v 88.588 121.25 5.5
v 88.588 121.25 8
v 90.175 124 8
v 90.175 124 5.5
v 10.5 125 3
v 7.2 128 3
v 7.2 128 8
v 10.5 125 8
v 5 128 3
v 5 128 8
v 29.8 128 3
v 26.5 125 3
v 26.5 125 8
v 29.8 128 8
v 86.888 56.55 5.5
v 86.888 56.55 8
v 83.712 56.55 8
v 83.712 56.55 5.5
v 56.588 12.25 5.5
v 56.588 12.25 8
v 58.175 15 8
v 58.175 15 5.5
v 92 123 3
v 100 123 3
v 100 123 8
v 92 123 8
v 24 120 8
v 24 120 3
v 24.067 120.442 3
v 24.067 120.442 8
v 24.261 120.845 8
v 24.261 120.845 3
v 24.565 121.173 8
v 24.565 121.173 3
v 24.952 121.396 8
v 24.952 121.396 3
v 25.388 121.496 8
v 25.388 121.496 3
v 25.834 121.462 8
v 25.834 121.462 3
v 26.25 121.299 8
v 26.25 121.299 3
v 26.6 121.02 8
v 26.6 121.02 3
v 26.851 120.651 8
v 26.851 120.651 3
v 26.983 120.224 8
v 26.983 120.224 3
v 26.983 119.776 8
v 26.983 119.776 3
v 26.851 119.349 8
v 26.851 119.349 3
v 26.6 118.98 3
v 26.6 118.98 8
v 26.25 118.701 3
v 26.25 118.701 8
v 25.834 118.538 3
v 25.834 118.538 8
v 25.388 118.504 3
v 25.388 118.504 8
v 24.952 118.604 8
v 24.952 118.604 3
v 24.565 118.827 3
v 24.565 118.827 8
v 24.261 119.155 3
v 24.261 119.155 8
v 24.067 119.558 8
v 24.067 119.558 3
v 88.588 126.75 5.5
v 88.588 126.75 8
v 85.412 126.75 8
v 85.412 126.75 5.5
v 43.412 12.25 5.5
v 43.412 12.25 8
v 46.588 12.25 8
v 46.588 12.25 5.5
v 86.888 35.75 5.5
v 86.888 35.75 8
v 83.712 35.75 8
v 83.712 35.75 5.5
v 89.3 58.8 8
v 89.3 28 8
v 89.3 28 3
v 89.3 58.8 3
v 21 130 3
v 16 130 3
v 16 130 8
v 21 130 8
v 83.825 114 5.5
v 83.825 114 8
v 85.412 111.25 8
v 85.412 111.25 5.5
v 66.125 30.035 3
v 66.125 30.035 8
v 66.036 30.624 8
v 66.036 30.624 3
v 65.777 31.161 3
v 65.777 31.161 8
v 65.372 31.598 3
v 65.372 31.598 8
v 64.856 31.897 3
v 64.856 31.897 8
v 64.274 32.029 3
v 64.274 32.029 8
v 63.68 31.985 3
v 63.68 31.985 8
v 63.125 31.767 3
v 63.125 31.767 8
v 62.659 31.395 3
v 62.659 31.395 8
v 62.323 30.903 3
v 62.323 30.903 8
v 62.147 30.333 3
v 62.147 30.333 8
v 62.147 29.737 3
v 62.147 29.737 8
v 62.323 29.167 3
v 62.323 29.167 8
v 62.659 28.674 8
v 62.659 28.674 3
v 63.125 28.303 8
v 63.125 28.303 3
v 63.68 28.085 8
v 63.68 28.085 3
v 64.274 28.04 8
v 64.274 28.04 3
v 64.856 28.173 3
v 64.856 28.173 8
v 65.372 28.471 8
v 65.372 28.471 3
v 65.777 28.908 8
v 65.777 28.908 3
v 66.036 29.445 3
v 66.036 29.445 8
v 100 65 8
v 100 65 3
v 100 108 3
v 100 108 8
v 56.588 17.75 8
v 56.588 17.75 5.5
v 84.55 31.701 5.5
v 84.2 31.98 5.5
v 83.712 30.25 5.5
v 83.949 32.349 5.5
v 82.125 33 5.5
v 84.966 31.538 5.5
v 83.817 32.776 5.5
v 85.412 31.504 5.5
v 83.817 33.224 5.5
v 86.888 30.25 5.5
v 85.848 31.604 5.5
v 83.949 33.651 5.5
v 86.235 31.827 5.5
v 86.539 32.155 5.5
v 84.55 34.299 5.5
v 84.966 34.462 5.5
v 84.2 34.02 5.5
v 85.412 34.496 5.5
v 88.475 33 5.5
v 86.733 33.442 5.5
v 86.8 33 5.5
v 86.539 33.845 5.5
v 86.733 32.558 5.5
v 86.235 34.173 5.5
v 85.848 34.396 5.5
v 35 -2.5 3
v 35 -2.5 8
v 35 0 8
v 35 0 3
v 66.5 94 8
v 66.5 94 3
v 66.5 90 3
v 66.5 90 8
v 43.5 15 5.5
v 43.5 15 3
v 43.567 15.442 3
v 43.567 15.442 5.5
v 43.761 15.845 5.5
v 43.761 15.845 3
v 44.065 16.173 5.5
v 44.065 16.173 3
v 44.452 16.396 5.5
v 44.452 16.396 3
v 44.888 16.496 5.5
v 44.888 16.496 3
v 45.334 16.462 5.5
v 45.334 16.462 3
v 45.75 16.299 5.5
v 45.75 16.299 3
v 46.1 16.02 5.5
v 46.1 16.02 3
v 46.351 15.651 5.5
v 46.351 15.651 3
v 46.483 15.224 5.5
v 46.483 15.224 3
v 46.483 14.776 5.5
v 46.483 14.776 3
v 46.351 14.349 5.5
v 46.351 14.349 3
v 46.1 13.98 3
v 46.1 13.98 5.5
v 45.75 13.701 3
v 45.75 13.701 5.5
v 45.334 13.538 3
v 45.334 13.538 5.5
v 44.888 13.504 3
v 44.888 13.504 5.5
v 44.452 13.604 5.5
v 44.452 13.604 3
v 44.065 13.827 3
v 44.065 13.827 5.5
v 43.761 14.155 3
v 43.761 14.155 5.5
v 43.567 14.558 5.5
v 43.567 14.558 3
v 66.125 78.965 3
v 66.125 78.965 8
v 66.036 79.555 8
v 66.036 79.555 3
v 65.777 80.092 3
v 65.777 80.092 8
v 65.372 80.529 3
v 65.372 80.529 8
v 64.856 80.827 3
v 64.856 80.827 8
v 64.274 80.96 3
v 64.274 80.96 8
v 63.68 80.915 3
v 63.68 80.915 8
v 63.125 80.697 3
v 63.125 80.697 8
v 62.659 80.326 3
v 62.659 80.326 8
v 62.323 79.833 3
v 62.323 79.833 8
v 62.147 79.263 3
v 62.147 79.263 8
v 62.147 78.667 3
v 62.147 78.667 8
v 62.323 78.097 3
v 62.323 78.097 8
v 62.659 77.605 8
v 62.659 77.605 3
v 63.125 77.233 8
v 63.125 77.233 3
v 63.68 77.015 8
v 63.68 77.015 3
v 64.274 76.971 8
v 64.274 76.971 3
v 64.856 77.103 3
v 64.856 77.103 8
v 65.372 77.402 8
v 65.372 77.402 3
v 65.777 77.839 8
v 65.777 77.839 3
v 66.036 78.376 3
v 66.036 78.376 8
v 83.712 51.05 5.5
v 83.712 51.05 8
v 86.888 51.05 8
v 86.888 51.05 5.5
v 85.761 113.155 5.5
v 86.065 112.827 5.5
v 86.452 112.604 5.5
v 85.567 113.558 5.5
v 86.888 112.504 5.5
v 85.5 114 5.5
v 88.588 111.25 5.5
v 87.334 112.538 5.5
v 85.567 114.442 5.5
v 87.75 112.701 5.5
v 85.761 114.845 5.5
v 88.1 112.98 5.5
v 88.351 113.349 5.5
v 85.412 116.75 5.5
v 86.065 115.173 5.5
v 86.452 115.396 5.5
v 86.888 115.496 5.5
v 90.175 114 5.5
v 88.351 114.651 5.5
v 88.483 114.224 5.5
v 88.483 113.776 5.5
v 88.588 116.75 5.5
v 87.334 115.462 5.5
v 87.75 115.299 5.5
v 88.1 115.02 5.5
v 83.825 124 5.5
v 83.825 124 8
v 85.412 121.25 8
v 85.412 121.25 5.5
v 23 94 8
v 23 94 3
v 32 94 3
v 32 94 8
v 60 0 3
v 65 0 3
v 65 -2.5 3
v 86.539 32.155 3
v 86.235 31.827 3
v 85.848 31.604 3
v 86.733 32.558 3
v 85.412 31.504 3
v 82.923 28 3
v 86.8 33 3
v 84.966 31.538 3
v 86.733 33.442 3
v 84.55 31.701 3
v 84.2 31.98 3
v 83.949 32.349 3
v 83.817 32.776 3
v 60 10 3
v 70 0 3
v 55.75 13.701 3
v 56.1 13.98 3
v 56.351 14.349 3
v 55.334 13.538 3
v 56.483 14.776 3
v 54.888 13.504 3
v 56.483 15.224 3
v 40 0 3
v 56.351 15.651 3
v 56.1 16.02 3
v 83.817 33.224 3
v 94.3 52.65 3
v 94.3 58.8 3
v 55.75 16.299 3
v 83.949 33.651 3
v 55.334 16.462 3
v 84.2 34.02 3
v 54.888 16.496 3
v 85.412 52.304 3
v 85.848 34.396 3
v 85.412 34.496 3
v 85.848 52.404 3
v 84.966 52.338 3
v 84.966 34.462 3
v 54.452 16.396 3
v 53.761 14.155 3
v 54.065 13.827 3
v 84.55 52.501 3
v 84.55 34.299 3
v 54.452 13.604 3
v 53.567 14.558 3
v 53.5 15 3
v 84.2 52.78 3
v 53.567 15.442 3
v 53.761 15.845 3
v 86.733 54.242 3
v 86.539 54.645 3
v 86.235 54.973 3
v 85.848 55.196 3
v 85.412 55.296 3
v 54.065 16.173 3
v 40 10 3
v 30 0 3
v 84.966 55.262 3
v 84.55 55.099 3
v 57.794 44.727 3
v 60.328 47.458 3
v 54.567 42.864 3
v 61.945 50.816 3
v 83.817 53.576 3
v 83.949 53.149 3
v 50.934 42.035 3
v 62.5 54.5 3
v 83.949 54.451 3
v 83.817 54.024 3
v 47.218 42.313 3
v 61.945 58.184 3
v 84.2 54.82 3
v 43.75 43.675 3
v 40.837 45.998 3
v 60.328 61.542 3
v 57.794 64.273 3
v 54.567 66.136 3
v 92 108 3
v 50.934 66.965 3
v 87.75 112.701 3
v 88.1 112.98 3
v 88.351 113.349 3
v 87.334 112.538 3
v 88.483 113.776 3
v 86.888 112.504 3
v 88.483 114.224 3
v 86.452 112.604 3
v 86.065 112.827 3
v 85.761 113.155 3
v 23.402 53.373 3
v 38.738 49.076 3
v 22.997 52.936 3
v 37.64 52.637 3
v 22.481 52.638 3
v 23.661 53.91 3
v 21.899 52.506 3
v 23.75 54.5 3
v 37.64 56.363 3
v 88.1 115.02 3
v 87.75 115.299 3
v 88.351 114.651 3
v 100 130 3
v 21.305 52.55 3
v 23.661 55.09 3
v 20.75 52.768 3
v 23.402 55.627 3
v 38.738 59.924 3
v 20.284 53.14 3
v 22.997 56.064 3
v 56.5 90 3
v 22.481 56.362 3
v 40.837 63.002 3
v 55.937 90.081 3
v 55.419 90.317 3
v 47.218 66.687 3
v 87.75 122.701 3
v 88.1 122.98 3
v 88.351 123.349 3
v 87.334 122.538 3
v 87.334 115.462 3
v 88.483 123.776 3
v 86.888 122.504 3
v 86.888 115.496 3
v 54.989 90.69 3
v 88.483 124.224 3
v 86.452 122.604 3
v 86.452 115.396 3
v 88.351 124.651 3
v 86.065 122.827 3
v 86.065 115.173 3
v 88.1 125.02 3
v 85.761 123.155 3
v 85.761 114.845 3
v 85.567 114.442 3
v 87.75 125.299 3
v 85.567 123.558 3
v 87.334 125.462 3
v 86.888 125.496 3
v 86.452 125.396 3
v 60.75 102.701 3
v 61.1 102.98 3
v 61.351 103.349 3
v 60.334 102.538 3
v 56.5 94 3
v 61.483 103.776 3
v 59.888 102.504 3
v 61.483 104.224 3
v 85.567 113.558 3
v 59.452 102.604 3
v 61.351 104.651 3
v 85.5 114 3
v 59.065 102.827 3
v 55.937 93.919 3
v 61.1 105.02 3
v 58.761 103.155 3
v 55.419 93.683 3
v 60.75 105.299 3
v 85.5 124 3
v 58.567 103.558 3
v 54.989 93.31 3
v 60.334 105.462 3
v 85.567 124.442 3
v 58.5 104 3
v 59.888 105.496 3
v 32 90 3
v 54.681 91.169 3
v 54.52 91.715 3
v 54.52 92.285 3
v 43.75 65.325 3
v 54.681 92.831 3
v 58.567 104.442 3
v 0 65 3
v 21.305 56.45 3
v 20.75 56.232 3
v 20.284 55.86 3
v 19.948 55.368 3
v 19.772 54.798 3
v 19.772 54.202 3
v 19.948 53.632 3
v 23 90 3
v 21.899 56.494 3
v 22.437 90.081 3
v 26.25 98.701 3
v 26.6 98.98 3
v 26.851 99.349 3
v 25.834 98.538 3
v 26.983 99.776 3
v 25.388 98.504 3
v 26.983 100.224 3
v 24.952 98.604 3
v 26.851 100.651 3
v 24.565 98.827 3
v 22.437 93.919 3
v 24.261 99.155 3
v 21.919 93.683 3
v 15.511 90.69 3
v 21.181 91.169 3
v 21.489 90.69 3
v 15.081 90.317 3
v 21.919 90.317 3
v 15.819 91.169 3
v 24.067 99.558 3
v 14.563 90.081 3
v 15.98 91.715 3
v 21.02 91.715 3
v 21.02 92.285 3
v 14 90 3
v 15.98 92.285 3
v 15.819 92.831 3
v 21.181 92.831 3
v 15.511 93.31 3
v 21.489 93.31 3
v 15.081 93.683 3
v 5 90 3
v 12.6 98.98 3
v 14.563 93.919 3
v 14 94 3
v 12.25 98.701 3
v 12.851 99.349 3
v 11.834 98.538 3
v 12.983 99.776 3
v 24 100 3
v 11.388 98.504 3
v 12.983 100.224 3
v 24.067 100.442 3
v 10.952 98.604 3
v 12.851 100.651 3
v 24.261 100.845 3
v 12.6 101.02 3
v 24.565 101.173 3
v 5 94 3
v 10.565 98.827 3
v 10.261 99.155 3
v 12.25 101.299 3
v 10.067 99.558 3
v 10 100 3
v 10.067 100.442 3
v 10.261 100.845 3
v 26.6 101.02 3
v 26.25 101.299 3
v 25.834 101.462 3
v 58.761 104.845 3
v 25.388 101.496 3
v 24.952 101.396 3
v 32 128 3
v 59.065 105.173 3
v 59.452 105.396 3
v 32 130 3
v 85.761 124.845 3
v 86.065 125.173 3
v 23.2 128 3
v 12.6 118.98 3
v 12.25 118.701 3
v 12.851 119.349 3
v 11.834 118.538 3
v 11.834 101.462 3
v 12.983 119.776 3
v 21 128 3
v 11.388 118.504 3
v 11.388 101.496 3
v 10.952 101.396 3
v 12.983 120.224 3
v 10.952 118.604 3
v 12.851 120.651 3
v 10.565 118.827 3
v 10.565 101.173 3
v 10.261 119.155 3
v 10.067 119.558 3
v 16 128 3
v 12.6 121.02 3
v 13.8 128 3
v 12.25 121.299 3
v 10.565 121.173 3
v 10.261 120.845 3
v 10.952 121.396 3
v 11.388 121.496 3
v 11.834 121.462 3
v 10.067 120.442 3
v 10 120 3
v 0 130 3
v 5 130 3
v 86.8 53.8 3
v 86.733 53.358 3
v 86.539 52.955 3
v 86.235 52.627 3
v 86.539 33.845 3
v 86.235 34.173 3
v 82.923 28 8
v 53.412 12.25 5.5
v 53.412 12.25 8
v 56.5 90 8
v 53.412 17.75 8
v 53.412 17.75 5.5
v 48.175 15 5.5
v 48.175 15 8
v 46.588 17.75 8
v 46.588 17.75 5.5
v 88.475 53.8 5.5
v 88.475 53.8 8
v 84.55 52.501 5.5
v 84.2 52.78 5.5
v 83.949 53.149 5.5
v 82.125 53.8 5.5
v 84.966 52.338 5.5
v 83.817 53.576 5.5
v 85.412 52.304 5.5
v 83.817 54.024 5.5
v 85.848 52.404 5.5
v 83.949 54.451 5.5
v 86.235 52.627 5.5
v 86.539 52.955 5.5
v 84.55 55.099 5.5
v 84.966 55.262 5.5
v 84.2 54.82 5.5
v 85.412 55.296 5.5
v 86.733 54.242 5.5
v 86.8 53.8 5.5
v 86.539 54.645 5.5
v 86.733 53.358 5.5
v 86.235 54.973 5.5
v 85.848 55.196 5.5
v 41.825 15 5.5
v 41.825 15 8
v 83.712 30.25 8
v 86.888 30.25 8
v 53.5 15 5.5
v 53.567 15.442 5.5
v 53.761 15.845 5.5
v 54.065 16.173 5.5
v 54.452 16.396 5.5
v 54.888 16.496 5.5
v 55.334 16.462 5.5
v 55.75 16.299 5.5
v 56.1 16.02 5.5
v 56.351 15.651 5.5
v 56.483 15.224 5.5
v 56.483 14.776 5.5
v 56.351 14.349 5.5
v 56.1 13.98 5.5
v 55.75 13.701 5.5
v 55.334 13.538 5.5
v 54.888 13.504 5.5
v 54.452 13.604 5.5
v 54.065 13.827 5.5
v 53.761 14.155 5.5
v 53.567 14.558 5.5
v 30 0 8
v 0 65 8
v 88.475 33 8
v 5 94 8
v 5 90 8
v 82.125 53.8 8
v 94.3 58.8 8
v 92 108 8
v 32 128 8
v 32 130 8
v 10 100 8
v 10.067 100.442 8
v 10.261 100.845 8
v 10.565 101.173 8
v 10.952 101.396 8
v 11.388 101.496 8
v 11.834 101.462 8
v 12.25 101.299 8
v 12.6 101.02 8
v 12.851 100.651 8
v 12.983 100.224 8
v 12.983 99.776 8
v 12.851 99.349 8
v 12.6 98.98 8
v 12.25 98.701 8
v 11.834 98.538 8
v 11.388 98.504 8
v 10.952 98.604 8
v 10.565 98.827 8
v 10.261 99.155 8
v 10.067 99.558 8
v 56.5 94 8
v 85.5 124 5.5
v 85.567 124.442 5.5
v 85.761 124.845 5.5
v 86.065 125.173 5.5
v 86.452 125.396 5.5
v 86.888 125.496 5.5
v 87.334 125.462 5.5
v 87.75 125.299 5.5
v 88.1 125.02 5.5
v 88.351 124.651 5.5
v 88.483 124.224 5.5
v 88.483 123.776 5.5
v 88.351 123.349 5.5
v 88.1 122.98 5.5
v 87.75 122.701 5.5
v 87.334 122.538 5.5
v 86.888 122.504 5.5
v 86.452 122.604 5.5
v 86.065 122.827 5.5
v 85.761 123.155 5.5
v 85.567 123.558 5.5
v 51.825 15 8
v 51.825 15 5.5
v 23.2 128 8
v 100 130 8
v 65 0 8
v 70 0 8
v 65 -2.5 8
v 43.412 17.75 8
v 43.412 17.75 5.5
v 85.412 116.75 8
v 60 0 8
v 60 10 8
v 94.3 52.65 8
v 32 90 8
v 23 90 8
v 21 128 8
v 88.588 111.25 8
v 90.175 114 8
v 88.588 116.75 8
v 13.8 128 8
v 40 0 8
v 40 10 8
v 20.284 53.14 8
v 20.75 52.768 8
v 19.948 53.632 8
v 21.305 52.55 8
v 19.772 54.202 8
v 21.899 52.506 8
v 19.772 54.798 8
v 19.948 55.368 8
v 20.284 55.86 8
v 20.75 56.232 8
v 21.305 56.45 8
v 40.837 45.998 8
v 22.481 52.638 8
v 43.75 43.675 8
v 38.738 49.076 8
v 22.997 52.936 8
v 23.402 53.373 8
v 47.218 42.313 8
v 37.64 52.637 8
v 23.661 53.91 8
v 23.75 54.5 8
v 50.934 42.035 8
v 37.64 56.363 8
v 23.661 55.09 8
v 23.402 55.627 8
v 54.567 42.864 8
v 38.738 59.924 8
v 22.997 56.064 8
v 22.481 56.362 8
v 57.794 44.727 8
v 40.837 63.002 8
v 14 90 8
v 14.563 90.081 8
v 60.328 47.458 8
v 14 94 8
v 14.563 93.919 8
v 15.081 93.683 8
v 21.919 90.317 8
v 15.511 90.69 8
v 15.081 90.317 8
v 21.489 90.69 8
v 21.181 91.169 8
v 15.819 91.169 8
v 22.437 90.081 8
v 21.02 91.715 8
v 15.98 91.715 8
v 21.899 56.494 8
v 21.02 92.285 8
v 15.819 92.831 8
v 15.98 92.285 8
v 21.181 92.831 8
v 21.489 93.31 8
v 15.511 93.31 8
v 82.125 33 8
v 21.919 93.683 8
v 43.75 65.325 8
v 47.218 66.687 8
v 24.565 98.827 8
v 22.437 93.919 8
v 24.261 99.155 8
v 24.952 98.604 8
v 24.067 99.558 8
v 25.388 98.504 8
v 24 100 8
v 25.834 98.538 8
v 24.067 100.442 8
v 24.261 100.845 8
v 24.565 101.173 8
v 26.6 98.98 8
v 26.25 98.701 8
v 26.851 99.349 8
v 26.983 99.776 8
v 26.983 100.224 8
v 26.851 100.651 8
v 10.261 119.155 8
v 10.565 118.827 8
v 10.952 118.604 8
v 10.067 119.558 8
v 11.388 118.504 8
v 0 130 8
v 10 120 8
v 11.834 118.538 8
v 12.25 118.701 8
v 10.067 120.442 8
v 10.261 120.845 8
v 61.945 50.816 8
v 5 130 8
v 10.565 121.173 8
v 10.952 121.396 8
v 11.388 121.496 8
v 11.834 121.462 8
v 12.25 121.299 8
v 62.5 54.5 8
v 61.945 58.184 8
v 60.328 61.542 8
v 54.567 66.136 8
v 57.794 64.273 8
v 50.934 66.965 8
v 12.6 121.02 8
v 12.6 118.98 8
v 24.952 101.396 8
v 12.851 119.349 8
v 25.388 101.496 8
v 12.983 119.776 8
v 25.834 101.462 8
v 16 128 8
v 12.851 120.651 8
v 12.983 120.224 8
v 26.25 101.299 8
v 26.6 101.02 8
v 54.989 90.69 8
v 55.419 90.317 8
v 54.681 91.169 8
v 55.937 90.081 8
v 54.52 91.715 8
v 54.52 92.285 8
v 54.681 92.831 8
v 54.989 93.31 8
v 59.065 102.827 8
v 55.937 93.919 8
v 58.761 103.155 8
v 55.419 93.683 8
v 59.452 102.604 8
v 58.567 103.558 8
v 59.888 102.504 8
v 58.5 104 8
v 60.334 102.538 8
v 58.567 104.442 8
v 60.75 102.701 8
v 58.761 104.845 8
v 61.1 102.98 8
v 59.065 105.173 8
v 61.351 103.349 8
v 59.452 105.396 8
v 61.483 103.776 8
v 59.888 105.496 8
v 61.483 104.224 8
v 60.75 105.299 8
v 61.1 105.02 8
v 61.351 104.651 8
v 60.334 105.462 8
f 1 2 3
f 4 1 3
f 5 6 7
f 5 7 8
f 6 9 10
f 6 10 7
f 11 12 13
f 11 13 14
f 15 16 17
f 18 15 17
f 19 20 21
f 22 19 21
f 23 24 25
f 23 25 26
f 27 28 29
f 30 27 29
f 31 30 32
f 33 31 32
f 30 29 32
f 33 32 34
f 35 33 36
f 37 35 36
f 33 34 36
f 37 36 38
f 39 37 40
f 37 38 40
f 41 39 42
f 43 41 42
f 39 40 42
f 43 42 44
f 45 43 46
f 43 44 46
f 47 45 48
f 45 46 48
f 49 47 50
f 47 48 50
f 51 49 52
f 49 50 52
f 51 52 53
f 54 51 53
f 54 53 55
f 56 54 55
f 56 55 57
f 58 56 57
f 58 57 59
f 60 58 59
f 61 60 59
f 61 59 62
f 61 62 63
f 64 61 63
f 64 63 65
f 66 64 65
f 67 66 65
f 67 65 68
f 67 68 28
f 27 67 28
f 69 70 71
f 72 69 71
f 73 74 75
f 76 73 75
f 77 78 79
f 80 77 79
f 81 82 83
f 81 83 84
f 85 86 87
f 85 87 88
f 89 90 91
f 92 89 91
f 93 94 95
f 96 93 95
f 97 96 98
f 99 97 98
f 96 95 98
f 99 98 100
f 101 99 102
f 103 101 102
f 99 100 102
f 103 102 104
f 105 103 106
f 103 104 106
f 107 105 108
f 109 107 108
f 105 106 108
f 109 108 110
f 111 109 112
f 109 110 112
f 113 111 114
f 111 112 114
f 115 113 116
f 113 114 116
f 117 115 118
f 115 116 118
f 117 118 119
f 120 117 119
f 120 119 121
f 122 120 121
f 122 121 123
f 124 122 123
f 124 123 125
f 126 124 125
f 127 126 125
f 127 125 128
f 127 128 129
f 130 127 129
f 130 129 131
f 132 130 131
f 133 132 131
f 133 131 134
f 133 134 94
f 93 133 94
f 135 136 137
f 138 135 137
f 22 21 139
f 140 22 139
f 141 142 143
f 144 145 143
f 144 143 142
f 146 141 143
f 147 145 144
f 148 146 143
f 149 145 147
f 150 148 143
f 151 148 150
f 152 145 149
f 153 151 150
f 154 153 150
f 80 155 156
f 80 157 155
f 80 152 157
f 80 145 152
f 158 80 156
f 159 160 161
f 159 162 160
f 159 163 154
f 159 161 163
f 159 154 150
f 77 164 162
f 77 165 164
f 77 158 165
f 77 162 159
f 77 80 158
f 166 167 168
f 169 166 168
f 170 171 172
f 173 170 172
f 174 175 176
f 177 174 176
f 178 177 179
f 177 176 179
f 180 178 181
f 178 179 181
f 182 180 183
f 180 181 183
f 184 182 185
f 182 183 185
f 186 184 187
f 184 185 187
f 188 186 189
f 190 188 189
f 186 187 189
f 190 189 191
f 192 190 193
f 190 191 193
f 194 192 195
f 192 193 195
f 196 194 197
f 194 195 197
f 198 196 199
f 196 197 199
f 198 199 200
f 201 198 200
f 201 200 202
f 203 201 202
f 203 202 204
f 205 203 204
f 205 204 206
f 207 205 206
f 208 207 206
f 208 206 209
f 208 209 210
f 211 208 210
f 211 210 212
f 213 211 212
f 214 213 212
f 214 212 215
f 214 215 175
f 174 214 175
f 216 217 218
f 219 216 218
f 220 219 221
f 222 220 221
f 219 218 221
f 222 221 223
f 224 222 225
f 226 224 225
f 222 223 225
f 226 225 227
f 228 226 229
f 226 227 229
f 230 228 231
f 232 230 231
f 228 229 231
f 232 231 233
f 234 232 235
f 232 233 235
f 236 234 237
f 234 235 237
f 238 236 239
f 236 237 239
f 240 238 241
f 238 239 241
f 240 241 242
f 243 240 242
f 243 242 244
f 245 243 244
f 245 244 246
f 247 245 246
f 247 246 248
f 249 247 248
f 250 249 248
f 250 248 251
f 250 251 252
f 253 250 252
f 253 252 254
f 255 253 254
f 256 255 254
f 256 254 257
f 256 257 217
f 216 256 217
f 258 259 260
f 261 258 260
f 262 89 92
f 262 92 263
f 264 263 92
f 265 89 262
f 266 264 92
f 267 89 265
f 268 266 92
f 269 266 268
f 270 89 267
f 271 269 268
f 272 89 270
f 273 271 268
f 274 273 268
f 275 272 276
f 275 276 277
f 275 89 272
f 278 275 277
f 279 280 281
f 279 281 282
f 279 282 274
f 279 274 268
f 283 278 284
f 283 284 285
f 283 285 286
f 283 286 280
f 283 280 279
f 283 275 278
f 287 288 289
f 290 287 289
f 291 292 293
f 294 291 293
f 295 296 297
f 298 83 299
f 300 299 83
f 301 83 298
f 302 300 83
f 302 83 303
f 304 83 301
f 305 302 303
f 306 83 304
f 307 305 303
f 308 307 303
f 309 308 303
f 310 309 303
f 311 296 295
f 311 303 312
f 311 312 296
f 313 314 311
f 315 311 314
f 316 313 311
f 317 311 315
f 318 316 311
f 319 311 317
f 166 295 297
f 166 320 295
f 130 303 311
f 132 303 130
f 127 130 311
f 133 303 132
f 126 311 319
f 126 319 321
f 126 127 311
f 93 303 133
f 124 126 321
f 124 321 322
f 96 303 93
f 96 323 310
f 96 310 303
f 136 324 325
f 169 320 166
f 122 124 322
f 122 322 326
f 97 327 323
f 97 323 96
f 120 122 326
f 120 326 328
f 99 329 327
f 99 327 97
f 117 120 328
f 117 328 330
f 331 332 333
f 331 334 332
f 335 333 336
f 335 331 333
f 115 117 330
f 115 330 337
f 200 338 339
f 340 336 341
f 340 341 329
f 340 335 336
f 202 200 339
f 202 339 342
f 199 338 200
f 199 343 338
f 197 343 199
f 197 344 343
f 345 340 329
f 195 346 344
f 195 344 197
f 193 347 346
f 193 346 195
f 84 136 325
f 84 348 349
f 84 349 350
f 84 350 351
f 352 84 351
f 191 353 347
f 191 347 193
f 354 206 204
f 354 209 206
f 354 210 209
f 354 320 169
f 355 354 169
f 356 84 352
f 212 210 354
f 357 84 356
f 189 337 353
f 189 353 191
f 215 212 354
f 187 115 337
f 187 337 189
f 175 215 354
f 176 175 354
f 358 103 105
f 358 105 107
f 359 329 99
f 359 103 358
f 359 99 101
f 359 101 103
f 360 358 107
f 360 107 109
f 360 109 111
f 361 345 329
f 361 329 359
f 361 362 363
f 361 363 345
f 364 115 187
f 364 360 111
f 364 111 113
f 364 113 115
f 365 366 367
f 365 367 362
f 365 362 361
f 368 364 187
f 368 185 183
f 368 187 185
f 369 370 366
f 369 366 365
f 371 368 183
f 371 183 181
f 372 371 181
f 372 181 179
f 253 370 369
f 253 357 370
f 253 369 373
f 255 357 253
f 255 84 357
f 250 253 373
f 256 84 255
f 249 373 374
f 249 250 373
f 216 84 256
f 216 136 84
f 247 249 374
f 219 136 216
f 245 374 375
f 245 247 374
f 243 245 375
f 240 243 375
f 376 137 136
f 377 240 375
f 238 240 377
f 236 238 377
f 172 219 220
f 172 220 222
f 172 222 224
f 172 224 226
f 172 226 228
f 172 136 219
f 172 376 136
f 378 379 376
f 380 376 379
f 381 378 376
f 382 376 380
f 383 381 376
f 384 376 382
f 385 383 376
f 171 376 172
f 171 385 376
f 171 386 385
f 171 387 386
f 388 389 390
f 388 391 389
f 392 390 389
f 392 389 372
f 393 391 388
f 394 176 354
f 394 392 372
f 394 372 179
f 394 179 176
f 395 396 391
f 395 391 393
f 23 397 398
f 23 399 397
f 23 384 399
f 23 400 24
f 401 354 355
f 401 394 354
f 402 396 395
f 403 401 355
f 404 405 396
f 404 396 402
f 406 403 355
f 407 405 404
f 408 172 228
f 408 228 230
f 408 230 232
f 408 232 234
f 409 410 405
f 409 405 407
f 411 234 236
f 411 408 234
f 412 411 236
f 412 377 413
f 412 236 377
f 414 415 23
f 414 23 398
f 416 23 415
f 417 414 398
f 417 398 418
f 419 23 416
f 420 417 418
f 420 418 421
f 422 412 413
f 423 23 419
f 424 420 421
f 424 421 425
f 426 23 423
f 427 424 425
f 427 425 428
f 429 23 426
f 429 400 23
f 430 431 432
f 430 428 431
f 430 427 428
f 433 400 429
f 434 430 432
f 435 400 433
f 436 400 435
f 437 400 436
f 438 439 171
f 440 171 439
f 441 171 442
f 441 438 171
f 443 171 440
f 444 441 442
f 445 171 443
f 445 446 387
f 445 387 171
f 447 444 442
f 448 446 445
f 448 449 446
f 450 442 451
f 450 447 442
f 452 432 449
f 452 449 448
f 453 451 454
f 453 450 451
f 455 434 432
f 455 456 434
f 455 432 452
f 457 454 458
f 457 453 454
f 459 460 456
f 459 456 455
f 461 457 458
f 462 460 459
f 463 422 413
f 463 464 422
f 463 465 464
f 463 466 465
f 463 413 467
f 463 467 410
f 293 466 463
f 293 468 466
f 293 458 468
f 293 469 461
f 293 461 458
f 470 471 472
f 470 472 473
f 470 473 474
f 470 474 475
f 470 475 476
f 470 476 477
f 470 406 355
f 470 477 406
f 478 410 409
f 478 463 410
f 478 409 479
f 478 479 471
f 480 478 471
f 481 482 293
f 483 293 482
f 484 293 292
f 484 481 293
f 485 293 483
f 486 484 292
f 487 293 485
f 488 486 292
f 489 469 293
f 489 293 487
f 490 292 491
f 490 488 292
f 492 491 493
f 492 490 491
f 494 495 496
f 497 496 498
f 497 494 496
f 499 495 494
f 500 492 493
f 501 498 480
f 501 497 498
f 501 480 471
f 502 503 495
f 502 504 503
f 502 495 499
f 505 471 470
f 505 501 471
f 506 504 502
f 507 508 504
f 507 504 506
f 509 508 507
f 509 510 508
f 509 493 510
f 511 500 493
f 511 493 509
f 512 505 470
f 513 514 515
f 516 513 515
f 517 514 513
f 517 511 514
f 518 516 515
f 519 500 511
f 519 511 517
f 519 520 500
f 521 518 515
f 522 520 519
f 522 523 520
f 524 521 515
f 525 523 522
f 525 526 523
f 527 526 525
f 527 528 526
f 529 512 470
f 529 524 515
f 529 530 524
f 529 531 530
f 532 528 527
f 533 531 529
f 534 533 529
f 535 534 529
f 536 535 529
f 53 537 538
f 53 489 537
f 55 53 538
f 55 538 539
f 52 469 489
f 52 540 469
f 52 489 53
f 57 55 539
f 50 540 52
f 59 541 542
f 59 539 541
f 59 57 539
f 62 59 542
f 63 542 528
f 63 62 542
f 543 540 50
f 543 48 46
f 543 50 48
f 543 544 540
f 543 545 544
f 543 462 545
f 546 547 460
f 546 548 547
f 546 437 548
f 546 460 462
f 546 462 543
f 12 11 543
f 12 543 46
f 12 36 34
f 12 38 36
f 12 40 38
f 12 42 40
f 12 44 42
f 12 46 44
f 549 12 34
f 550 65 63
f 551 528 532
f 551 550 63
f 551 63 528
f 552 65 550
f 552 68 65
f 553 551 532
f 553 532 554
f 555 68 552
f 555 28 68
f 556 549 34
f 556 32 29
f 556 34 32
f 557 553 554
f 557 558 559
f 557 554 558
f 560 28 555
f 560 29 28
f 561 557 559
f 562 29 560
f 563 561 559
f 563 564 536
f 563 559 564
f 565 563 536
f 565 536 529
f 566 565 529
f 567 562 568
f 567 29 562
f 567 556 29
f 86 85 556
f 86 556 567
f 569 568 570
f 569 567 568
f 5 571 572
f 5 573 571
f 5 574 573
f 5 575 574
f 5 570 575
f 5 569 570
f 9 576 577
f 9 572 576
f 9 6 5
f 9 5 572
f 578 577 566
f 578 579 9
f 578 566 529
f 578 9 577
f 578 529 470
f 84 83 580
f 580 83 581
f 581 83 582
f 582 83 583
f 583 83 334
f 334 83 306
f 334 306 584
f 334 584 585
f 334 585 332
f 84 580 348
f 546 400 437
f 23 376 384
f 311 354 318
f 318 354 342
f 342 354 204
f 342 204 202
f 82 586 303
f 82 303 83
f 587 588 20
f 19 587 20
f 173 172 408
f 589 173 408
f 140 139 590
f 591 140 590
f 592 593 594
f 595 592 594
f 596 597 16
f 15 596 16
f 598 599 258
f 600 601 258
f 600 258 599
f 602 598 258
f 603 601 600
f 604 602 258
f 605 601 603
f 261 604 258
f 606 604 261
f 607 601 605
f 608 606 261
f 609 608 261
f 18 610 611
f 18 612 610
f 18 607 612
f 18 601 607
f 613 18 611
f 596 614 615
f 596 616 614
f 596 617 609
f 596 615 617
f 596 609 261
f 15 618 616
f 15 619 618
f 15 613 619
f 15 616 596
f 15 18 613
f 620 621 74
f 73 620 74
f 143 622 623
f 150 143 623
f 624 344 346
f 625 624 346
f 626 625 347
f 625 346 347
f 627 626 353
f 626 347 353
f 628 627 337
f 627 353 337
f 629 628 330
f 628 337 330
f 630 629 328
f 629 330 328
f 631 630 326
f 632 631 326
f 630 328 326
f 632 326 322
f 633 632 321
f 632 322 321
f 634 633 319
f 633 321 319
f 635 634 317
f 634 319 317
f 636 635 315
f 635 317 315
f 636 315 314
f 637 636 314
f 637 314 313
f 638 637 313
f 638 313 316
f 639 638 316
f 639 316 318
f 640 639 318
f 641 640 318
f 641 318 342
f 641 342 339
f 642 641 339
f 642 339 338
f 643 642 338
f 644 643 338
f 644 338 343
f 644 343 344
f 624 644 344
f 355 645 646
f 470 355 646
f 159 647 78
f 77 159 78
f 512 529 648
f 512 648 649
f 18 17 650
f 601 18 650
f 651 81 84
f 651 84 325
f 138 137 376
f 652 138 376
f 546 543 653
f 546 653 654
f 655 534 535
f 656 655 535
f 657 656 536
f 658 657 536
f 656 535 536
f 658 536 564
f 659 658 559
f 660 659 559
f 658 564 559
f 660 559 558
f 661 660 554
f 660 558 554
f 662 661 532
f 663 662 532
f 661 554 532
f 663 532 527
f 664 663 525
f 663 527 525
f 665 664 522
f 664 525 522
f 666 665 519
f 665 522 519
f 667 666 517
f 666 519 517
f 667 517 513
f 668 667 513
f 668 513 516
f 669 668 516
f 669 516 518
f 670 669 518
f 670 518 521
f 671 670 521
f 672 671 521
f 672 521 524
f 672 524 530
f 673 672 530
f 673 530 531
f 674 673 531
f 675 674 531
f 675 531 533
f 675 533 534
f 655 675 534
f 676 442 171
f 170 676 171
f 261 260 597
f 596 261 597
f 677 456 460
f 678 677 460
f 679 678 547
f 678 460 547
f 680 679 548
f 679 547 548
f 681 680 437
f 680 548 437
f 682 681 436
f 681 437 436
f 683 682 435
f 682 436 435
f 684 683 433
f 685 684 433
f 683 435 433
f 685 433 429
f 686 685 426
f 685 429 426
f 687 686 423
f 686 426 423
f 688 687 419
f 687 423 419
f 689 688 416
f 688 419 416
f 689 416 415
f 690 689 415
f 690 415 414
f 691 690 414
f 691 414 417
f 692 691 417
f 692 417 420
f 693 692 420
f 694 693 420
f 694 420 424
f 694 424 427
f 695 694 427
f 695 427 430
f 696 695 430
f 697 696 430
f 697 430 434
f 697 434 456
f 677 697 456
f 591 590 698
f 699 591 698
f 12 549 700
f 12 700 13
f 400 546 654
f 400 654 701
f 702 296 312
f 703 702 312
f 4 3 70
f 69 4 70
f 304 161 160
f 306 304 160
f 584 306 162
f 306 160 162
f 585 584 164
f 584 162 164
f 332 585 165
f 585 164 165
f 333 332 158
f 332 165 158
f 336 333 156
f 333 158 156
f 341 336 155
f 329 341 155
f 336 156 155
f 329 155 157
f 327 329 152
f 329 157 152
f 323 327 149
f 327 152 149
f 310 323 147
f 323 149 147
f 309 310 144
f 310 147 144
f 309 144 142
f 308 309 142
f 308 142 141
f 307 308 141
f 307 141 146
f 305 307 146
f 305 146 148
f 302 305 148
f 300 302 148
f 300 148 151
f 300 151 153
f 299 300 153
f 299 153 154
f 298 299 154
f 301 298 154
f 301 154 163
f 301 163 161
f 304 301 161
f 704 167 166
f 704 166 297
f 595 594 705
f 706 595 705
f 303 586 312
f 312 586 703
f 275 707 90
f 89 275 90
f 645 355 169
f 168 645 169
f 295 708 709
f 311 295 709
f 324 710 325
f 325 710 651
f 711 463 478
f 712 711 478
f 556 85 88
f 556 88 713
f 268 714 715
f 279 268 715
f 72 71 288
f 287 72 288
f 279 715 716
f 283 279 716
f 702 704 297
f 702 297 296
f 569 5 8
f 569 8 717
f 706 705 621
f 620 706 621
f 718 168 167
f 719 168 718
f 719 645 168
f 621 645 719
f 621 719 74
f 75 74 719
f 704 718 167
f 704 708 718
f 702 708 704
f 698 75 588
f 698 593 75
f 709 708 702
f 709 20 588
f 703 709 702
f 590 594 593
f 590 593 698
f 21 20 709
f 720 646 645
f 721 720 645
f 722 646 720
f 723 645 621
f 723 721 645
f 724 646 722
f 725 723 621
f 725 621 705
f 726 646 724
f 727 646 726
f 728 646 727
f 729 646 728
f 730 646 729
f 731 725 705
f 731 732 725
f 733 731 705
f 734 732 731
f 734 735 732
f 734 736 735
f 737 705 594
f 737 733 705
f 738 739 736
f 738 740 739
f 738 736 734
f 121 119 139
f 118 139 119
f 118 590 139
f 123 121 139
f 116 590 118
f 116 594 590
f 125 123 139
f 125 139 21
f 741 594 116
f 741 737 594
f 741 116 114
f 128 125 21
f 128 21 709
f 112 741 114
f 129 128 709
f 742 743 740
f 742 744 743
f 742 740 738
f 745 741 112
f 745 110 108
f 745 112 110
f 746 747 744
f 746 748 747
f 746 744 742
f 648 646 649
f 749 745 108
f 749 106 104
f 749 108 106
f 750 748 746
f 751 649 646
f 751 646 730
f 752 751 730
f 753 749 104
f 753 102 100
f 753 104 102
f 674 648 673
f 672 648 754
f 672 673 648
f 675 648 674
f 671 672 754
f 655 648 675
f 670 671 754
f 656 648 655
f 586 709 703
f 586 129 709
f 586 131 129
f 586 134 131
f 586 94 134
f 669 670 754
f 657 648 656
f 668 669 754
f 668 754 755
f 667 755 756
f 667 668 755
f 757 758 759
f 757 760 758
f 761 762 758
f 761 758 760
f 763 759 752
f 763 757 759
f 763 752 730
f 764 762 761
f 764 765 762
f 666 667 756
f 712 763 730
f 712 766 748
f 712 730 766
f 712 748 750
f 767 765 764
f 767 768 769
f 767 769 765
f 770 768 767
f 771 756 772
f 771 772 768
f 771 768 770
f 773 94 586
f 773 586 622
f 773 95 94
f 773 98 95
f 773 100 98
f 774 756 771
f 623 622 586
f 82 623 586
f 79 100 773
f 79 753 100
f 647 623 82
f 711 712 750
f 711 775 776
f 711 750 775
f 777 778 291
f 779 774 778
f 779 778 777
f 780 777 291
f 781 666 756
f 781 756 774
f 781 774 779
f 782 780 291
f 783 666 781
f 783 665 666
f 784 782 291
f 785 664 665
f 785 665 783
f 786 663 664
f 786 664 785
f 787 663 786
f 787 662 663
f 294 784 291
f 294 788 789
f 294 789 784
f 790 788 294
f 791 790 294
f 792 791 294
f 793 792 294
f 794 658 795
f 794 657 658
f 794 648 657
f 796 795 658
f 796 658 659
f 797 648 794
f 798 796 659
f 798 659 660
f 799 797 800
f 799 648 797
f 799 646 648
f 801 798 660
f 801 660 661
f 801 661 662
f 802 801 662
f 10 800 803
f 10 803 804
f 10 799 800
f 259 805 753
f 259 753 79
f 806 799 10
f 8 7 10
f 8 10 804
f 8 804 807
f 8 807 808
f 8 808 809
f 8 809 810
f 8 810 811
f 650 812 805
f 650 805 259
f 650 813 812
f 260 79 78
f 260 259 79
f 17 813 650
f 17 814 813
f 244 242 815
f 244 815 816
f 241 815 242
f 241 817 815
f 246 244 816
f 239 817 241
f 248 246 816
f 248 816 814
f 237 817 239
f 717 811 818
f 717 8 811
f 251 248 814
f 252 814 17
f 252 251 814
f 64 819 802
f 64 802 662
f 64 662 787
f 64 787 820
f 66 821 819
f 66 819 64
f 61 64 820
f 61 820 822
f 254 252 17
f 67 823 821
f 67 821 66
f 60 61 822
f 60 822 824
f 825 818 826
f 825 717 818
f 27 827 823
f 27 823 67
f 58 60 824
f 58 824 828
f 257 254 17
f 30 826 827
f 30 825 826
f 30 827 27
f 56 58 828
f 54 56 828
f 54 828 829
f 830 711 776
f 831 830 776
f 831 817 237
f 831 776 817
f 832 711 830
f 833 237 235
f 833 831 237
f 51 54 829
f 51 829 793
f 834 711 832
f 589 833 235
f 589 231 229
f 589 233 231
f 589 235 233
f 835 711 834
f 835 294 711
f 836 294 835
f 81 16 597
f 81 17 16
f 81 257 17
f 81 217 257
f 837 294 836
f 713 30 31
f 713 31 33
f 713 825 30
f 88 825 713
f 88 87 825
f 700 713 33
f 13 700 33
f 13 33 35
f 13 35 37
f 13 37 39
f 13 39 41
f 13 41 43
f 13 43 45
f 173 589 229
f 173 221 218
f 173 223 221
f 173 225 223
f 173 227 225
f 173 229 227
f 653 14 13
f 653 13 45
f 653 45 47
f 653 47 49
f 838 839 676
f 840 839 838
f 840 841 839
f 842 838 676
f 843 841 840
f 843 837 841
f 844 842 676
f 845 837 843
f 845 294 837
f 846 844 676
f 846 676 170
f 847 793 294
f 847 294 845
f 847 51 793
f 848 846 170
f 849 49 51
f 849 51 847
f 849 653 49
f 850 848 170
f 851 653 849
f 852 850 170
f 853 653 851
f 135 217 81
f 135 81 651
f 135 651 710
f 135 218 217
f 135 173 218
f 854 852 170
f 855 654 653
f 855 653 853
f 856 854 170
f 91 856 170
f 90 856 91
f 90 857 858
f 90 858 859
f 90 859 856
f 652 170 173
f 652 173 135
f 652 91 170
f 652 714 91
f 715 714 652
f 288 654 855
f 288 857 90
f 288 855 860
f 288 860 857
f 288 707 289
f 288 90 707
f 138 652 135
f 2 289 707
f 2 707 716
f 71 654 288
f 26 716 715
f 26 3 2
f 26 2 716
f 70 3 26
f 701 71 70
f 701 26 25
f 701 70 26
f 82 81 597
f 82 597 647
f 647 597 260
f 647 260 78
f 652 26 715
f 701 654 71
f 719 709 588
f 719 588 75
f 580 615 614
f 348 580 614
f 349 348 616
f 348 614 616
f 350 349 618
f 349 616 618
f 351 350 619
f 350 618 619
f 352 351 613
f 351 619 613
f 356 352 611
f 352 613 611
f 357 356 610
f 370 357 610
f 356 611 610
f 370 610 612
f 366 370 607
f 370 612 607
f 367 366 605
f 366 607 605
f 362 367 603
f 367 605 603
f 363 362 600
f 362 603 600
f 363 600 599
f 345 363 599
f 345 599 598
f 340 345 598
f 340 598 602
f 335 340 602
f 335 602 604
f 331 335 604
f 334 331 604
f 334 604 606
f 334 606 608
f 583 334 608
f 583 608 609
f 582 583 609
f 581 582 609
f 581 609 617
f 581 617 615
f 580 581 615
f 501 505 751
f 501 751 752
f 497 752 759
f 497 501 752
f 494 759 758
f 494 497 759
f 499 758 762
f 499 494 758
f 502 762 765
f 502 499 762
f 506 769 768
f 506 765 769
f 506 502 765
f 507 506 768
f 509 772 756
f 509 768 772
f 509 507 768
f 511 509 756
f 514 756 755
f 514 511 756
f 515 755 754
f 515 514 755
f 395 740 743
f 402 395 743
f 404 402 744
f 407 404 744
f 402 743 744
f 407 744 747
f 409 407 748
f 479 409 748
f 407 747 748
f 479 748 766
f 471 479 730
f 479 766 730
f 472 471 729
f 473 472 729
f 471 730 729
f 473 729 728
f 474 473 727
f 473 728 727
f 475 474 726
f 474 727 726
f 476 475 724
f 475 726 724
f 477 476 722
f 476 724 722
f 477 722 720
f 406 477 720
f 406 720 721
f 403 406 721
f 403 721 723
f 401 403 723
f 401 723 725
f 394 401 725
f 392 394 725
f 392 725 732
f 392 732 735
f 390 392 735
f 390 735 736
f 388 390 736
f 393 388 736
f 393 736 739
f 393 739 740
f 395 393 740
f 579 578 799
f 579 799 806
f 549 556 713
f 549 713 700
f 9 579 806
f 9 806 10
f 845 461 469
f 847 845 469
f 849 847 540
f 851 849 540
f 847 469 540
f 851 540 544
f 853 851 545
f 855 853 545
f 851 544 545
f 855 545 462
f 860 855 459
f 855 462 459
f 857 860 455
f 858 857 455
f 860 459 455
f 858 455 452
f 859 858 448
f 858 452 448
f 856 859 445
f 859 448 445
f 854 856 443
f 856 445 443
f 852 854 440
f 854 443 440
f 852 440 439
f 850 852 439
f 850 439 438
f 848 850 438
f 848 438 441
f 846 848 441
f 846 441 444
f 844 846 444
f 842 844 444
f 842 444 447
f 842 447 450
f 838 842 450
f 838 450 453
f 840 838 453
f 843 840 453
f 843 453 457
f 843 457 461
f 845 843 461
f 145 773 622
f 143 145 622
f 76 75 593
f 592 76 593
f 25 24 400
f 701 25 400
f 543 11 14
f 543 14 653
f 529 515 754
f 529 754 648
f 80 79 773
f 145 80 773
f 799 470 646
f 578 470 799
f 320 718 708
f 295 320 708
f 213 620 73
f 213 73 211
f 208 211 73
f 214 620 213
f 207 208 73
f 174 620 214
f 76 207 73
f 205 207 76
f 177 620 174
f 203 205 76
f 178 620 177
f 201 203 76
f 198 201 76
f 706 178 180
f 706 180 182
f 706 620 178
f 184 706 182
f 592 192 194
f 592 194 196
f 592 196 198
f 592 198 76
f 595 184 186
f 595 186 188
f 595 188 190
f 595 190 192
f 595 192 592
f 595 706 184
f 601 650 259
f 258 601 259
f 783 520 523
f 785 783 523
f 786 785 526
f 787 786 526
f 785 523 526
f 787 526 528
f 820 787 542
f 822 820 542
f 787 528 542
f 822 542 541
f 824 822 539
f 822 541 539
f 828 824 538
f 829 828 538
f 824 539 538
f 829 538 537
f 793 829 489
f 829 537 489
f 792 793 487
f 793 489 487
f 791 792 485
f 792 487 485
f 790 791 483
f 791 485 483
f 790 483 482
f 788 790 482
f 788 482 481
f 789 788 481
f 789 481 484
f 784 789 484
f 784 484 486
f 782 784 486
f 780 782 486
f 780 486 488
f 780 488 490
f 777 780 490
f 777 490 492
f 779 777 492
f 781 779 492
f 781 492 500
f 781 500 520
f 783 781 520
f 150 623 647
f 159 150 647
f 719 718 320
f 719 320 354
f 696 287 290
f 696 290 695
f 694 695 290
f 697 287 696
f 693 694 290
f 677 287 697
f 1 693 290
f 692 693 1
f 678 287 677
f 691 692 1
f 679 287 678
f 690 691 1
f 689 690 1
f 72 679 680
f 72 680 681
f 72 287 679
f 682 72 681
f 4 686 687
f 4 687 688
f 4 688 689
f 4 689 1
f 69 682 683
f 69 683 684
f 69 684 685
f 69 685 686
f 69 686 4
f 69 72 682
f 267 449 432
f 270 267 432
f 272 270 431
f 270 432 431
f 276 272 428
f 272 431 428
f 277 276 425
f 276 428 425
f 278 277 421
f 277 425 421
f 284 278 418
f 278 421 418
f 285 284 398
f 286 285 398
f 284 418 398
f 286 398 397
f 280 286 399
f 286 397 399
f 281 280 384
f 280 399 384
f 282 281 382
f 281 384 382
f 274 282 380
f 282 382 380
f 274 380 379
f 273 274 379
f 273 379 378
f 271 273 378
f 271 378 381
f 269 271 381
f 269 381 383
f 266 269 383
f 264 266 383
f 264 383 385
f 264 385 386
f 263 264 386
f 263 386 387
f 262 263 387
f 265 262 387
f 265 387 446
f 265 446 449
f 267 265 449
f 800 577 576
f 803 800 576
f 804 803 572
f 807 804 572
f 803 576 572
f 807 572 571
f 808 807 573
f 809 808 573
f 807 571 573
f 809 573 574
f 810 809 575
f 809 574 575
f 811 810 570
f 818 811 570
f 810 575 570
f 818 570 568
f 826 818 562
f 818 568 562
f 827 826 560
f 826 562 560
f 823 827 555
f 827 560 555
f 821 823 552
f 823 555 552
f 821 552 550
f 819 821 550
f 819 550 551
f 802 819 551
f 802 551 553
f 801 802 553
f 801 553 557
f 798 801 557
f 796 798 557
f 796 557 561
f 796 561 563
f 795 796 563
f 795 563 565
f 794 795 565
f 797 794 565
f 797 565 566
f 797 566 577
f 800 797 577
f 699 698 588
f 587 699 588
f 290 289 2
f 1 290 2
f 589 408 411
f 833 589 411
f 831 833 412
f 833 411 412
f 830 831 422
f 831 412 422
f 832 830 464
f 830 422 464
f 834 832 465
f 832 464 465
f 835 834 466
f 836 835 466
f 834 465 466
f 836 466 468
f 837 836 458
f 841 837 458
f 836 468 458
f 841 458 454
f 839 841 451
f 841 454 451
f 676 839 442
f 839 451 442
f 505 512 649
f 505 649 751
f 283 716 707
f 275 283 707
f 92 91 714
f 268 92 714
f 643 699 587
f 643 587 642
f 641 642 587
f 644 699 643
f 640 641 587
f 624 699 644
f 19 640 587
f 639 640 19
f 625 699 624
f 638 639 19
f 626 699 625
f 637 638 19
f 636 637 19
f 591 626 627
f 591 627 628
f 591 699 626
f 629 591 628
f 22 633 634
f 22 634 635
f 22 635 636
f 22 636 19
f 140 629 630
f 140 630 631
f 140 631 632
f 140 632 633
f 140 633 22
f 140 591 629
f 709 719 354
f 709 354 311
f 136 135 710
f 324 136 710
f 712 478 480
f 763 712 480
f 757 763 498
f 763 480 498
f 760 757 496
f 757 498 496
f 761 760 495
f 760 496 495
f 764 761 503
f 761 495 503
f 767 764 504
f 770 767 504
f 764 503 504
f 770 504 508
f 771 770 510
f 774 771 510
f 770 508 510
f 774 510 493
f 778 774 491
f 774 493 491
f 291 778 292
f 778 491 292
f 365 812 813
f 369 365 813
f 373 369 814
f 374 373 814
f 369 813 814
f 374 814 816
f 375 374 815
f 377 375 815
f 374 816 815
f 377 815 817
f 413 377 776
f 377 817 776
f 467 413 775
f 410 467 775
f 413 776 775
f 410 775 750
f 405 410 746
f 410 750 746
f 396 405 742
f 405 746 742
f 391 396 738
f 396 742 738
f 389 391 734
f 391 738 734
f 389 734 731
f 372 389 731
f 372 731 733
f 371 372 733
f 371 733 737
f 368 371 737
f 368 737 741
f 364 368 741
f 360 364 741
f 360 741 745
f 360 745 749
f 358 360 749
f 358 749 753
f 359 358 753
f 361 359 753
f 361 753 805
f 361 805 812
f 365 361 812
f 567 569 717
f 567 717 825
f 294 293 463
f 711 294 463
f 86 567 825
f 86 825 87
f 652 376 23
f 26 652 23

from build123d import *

# Parameters (mm, degrees)
SKETCH_1_W          = 100
SKETCH_1_H          = 130
EXTRUDE_1_DEPTH     = 8
SKETCH_3_W          = 20
SKETCH_3_H          = 10
CUT_EXTRUDE_1_DEPTH = 8
SKETCH_4_R          = 1.5
SKETCH_4_W          = 8
SKETCH_4_H          = 15
CUT_EXTRUDE_2_DEPTH = 9
CUT_EXTRUDE_6_DEPTH = 2.5
SKETCH_10_R         = 12.5
SKETCH_10_W         = 5
SKETCH_10_H         = 30.8
CUT_EXTRUDE_7_DEPTH = 9
EXTRUDE_3_DEPTH     = 8
SKETCH_5_R          = 2
SKETCH_5_R_2        = 1.5
CUT_EXTRUDE_3_DEPTH = 9
SKETCH_11_W         = 30
SKETCH_11_H         = 2.5
EXTRUDE_2_DEPTH     = 8
CUT_EXTRUDE_8_DEPTH = 2.5
SKETCH_15_W         = 100
SKETCH_15_H         = 135
CUT_EXTRUDE_9_DEPTH = 3


with BuildPart() as part:
    # 草图1 → 凸台-拉伸1 (new body)
    with BuildSketch(Plane.XY):
        with Locations((50, 65)):
            Rectangle(SKETCH_1_W, SKETCH_1_H)
    extrude(amount=EXTRUDE_1_DEPTH)

    # 草图3 → 切除-拉伸1 (cut)
    with BuildSketch(Plane.XY.offset(8)):
        with Locations((50, 5)):
            Rectangle(SKETCH_3_W, SKETCH_3_H)
        Polygon((0, 0), (30, 0), (0, 65), align=None)
        Polygon((100, 0), (100, 65), (70, 0), align=None)
    extrude(amount=-CUT_EXTRUDE_1_DEPTH, mode=Mode.SUBTRACT)

    # 草图4 → 切除-拉伸2 (cut, through all)
    with BuildSketch(Plane(origin=(0, 0, 0), x_dir=(-1, 0, 0), z_dir=(0, 0, -1))):
        with Locations((-87, 124)):
            Circle(SKETCH_4_R)
        with Locations((-25.5, 100)):
            Circle(SKETCH_4_R)
        with Locations((-11.5, 100)):
            Circle(SKETCH_4_R)
        with Locations((-11.5, 120)):
            Circle(SKETCH_4_R)
        with Locations((-25.5, 120)):
            Circle(SKETCH_4_R)
        with Locations((-60, 104)):
            Circle(SKETCH_4_R)
        with Locations((-45, 15)):
            Circle(SKETCH_4_R)
        with Locations((-55, 15)):
            Circle(SKETCH_4_R)
        with Locations((-87, 114)):
            Circle(SKETCH_4_R)
        with BuildLine():
            Line((-56.5, 94), (-66.5, 94))
            Line((-66.5, 94), (-66.5, 90))
            Line((-66.5, 90), (-56.5, 90))
            ThreePointArc((-56.5, 90), (-54.5, 92), (-56.5, 94))
        make_face()
        with Locations((-96, 115.5)):
            Rectangle(SKETCH_4_W, SKETCH_4_H)
        with BuildLine():
            Line((-32, 94), (-32, 90))
            Line((-32, 90), (-23, 90))
            ThreePointArc((-23, 90), (-21, 92), (-23, 94))
            Line((-23, 94), (-32, 94))
        make_face()
        with BuildLine():
            Line((-5, 94), (-5, 90))
            Line((-5, 90), (-14, 90))
            ThreePointArc((-14, 90), (-16, 92), (-14, 94))
            Line((-14, 94), (-5, 94))
        make_face()
        Polygon((-10.5, 125), (-13.8, 128), (-16, 128), (-16, 130), (-5, 130), (-5, 128), (-7.2, 128), align=None)
        Polygon((-26.5, 125), (-29.8, 128), (-32, 128), (-32, 130), (-21, 130), (-21, 128), (-23.2, 128), align=None)
    extrude(amount=-CUT_EXTRUDE_2_DEPTH, mode=Mode.SUBTRACT)

    # 草图9 → 切除-拉伸6 (cut)
    with BuildSketch(Plane.XY.offset(8)):
        Polygon((90.175426481, 124), (88.58771324, 126.75), (85.41228676, 126.75), (83.824573519, 124), (85.41228676, 121.25), (88.58771324, 121.25), align=None)
        Polygon((90.175426481, 114), (88.58771324, 116.75), (85.41228676, 116.75), (83.824573519, 114), (85.41228676, 111.25), (88.58771324, 111.25), align=None)
        Polygon((48.175426481, 15), (46.58771324, 17.75), (43.41228676, 17.75), (41.824573519, 15), (43.41228676, 12.25), (46.58771324, 12.25), align=None)
        Polygon((58.175426481, 15), (56.58771324, 17.75), (53.41228676, 17.75), (51.824573519, 15), (53.41228676, 12.25), (56.58771324, 12.25), align=None)
    extrude(amount=-CUT_EXTRUDE_6_DEPTH, mode=Mode.SUBTRACT)

    # 草图10 → 切除-拉伸7 (cut, through all)
    with BuildSketch(Plane.XY.offset(8)):
        with Locations((50, 54.5)):
            Circle(SKETCH_10_R)
        with Locations((91.8, 43.4)):
            Rectangle(SKETCH_10_W, SKETCH_10_H)
    extrude(amount=-CUT_EXTRUDE_7_DEPTH, mode=Mode.SUBTRACT)

    # 草图12 → 凸台-拉伸3 (add)
    with BuildSketch(Plane.XY.offset(8)):
        Polygon((89.3, 41.816666667), (82.923076923, 28), (89.3, 28), align=None)
    extrude(amount=-EXTRUDE_3_DEPTH)

    # 草图5 → 切除-拉伸3 (cut, through all)
    with BuildSketch(Plane.XY.offset(8)):
        with Locations((21.75, 54.5)):
            Circle(SKETCH_5_R)
        with Locations((64.125, 78.965217657)):
            Circle(SKETCH_5_R)
        with Locations((64.125, 30.034782343)):
            Circle(SKETCH_5_R)
        with Locations((85.3, 53.8)):
            Circle(SKETCH_5_R_2)
        with Locations((85.3, 33)):
            Circle(SKETCH_5_R_2)
    extrude(amount=-CUT_EXTRUDE_3_DEPTH, mode=Mode.SUBTRACT)

    # 草图11 → 凸台-拉伸2 (add)
    with BuildSketch(Plane.XY.offset(8)):
        with Locations((50, -1.25)):
            Rectangle(SKETCH_11_W, SKETCH_11_H)
    extrude(amount=-EXTRUDE_2_DEPTH)

    # 草图14 → 切除-拉伸8 (cut)
    with BuildSketch(Plane.XY.offset(8)):
        Polygon((88.475426481, 53.8), (86.88771324, 56.55), (83.71228676, 56.55), (82.124573519, 53.8), (83.71228676, 51.05), (86.88771324, 51.05), align=None)
        Polygon((88.475426481, 33), (86.88771324, 35.75), (83.71228676, 35.75), (82.124573519, 33), (83.71228676, 30.25), (86.88771324, 30.25), align=None)
    extrude(amount=-CUT_EXTRUDE_8_DEPTH, mode=Mode.SUBTRACT)

    # 草图15 → 切除-拉伸9 (cut)
    with BuildSketch(Plane(origin=(0, 0, 0), x_dir=(-1, 0, 0), z_dir=(0, 0, -1))):
        with Locations((-50, 62.5)):
            Rectangle(SKETCH_15_W, SKETCH_15_H)
    extrude(amount=-CUT_EXTRUDE_9_DEPTH, mode=Mode.SUBTRACT)


solid = part.part
